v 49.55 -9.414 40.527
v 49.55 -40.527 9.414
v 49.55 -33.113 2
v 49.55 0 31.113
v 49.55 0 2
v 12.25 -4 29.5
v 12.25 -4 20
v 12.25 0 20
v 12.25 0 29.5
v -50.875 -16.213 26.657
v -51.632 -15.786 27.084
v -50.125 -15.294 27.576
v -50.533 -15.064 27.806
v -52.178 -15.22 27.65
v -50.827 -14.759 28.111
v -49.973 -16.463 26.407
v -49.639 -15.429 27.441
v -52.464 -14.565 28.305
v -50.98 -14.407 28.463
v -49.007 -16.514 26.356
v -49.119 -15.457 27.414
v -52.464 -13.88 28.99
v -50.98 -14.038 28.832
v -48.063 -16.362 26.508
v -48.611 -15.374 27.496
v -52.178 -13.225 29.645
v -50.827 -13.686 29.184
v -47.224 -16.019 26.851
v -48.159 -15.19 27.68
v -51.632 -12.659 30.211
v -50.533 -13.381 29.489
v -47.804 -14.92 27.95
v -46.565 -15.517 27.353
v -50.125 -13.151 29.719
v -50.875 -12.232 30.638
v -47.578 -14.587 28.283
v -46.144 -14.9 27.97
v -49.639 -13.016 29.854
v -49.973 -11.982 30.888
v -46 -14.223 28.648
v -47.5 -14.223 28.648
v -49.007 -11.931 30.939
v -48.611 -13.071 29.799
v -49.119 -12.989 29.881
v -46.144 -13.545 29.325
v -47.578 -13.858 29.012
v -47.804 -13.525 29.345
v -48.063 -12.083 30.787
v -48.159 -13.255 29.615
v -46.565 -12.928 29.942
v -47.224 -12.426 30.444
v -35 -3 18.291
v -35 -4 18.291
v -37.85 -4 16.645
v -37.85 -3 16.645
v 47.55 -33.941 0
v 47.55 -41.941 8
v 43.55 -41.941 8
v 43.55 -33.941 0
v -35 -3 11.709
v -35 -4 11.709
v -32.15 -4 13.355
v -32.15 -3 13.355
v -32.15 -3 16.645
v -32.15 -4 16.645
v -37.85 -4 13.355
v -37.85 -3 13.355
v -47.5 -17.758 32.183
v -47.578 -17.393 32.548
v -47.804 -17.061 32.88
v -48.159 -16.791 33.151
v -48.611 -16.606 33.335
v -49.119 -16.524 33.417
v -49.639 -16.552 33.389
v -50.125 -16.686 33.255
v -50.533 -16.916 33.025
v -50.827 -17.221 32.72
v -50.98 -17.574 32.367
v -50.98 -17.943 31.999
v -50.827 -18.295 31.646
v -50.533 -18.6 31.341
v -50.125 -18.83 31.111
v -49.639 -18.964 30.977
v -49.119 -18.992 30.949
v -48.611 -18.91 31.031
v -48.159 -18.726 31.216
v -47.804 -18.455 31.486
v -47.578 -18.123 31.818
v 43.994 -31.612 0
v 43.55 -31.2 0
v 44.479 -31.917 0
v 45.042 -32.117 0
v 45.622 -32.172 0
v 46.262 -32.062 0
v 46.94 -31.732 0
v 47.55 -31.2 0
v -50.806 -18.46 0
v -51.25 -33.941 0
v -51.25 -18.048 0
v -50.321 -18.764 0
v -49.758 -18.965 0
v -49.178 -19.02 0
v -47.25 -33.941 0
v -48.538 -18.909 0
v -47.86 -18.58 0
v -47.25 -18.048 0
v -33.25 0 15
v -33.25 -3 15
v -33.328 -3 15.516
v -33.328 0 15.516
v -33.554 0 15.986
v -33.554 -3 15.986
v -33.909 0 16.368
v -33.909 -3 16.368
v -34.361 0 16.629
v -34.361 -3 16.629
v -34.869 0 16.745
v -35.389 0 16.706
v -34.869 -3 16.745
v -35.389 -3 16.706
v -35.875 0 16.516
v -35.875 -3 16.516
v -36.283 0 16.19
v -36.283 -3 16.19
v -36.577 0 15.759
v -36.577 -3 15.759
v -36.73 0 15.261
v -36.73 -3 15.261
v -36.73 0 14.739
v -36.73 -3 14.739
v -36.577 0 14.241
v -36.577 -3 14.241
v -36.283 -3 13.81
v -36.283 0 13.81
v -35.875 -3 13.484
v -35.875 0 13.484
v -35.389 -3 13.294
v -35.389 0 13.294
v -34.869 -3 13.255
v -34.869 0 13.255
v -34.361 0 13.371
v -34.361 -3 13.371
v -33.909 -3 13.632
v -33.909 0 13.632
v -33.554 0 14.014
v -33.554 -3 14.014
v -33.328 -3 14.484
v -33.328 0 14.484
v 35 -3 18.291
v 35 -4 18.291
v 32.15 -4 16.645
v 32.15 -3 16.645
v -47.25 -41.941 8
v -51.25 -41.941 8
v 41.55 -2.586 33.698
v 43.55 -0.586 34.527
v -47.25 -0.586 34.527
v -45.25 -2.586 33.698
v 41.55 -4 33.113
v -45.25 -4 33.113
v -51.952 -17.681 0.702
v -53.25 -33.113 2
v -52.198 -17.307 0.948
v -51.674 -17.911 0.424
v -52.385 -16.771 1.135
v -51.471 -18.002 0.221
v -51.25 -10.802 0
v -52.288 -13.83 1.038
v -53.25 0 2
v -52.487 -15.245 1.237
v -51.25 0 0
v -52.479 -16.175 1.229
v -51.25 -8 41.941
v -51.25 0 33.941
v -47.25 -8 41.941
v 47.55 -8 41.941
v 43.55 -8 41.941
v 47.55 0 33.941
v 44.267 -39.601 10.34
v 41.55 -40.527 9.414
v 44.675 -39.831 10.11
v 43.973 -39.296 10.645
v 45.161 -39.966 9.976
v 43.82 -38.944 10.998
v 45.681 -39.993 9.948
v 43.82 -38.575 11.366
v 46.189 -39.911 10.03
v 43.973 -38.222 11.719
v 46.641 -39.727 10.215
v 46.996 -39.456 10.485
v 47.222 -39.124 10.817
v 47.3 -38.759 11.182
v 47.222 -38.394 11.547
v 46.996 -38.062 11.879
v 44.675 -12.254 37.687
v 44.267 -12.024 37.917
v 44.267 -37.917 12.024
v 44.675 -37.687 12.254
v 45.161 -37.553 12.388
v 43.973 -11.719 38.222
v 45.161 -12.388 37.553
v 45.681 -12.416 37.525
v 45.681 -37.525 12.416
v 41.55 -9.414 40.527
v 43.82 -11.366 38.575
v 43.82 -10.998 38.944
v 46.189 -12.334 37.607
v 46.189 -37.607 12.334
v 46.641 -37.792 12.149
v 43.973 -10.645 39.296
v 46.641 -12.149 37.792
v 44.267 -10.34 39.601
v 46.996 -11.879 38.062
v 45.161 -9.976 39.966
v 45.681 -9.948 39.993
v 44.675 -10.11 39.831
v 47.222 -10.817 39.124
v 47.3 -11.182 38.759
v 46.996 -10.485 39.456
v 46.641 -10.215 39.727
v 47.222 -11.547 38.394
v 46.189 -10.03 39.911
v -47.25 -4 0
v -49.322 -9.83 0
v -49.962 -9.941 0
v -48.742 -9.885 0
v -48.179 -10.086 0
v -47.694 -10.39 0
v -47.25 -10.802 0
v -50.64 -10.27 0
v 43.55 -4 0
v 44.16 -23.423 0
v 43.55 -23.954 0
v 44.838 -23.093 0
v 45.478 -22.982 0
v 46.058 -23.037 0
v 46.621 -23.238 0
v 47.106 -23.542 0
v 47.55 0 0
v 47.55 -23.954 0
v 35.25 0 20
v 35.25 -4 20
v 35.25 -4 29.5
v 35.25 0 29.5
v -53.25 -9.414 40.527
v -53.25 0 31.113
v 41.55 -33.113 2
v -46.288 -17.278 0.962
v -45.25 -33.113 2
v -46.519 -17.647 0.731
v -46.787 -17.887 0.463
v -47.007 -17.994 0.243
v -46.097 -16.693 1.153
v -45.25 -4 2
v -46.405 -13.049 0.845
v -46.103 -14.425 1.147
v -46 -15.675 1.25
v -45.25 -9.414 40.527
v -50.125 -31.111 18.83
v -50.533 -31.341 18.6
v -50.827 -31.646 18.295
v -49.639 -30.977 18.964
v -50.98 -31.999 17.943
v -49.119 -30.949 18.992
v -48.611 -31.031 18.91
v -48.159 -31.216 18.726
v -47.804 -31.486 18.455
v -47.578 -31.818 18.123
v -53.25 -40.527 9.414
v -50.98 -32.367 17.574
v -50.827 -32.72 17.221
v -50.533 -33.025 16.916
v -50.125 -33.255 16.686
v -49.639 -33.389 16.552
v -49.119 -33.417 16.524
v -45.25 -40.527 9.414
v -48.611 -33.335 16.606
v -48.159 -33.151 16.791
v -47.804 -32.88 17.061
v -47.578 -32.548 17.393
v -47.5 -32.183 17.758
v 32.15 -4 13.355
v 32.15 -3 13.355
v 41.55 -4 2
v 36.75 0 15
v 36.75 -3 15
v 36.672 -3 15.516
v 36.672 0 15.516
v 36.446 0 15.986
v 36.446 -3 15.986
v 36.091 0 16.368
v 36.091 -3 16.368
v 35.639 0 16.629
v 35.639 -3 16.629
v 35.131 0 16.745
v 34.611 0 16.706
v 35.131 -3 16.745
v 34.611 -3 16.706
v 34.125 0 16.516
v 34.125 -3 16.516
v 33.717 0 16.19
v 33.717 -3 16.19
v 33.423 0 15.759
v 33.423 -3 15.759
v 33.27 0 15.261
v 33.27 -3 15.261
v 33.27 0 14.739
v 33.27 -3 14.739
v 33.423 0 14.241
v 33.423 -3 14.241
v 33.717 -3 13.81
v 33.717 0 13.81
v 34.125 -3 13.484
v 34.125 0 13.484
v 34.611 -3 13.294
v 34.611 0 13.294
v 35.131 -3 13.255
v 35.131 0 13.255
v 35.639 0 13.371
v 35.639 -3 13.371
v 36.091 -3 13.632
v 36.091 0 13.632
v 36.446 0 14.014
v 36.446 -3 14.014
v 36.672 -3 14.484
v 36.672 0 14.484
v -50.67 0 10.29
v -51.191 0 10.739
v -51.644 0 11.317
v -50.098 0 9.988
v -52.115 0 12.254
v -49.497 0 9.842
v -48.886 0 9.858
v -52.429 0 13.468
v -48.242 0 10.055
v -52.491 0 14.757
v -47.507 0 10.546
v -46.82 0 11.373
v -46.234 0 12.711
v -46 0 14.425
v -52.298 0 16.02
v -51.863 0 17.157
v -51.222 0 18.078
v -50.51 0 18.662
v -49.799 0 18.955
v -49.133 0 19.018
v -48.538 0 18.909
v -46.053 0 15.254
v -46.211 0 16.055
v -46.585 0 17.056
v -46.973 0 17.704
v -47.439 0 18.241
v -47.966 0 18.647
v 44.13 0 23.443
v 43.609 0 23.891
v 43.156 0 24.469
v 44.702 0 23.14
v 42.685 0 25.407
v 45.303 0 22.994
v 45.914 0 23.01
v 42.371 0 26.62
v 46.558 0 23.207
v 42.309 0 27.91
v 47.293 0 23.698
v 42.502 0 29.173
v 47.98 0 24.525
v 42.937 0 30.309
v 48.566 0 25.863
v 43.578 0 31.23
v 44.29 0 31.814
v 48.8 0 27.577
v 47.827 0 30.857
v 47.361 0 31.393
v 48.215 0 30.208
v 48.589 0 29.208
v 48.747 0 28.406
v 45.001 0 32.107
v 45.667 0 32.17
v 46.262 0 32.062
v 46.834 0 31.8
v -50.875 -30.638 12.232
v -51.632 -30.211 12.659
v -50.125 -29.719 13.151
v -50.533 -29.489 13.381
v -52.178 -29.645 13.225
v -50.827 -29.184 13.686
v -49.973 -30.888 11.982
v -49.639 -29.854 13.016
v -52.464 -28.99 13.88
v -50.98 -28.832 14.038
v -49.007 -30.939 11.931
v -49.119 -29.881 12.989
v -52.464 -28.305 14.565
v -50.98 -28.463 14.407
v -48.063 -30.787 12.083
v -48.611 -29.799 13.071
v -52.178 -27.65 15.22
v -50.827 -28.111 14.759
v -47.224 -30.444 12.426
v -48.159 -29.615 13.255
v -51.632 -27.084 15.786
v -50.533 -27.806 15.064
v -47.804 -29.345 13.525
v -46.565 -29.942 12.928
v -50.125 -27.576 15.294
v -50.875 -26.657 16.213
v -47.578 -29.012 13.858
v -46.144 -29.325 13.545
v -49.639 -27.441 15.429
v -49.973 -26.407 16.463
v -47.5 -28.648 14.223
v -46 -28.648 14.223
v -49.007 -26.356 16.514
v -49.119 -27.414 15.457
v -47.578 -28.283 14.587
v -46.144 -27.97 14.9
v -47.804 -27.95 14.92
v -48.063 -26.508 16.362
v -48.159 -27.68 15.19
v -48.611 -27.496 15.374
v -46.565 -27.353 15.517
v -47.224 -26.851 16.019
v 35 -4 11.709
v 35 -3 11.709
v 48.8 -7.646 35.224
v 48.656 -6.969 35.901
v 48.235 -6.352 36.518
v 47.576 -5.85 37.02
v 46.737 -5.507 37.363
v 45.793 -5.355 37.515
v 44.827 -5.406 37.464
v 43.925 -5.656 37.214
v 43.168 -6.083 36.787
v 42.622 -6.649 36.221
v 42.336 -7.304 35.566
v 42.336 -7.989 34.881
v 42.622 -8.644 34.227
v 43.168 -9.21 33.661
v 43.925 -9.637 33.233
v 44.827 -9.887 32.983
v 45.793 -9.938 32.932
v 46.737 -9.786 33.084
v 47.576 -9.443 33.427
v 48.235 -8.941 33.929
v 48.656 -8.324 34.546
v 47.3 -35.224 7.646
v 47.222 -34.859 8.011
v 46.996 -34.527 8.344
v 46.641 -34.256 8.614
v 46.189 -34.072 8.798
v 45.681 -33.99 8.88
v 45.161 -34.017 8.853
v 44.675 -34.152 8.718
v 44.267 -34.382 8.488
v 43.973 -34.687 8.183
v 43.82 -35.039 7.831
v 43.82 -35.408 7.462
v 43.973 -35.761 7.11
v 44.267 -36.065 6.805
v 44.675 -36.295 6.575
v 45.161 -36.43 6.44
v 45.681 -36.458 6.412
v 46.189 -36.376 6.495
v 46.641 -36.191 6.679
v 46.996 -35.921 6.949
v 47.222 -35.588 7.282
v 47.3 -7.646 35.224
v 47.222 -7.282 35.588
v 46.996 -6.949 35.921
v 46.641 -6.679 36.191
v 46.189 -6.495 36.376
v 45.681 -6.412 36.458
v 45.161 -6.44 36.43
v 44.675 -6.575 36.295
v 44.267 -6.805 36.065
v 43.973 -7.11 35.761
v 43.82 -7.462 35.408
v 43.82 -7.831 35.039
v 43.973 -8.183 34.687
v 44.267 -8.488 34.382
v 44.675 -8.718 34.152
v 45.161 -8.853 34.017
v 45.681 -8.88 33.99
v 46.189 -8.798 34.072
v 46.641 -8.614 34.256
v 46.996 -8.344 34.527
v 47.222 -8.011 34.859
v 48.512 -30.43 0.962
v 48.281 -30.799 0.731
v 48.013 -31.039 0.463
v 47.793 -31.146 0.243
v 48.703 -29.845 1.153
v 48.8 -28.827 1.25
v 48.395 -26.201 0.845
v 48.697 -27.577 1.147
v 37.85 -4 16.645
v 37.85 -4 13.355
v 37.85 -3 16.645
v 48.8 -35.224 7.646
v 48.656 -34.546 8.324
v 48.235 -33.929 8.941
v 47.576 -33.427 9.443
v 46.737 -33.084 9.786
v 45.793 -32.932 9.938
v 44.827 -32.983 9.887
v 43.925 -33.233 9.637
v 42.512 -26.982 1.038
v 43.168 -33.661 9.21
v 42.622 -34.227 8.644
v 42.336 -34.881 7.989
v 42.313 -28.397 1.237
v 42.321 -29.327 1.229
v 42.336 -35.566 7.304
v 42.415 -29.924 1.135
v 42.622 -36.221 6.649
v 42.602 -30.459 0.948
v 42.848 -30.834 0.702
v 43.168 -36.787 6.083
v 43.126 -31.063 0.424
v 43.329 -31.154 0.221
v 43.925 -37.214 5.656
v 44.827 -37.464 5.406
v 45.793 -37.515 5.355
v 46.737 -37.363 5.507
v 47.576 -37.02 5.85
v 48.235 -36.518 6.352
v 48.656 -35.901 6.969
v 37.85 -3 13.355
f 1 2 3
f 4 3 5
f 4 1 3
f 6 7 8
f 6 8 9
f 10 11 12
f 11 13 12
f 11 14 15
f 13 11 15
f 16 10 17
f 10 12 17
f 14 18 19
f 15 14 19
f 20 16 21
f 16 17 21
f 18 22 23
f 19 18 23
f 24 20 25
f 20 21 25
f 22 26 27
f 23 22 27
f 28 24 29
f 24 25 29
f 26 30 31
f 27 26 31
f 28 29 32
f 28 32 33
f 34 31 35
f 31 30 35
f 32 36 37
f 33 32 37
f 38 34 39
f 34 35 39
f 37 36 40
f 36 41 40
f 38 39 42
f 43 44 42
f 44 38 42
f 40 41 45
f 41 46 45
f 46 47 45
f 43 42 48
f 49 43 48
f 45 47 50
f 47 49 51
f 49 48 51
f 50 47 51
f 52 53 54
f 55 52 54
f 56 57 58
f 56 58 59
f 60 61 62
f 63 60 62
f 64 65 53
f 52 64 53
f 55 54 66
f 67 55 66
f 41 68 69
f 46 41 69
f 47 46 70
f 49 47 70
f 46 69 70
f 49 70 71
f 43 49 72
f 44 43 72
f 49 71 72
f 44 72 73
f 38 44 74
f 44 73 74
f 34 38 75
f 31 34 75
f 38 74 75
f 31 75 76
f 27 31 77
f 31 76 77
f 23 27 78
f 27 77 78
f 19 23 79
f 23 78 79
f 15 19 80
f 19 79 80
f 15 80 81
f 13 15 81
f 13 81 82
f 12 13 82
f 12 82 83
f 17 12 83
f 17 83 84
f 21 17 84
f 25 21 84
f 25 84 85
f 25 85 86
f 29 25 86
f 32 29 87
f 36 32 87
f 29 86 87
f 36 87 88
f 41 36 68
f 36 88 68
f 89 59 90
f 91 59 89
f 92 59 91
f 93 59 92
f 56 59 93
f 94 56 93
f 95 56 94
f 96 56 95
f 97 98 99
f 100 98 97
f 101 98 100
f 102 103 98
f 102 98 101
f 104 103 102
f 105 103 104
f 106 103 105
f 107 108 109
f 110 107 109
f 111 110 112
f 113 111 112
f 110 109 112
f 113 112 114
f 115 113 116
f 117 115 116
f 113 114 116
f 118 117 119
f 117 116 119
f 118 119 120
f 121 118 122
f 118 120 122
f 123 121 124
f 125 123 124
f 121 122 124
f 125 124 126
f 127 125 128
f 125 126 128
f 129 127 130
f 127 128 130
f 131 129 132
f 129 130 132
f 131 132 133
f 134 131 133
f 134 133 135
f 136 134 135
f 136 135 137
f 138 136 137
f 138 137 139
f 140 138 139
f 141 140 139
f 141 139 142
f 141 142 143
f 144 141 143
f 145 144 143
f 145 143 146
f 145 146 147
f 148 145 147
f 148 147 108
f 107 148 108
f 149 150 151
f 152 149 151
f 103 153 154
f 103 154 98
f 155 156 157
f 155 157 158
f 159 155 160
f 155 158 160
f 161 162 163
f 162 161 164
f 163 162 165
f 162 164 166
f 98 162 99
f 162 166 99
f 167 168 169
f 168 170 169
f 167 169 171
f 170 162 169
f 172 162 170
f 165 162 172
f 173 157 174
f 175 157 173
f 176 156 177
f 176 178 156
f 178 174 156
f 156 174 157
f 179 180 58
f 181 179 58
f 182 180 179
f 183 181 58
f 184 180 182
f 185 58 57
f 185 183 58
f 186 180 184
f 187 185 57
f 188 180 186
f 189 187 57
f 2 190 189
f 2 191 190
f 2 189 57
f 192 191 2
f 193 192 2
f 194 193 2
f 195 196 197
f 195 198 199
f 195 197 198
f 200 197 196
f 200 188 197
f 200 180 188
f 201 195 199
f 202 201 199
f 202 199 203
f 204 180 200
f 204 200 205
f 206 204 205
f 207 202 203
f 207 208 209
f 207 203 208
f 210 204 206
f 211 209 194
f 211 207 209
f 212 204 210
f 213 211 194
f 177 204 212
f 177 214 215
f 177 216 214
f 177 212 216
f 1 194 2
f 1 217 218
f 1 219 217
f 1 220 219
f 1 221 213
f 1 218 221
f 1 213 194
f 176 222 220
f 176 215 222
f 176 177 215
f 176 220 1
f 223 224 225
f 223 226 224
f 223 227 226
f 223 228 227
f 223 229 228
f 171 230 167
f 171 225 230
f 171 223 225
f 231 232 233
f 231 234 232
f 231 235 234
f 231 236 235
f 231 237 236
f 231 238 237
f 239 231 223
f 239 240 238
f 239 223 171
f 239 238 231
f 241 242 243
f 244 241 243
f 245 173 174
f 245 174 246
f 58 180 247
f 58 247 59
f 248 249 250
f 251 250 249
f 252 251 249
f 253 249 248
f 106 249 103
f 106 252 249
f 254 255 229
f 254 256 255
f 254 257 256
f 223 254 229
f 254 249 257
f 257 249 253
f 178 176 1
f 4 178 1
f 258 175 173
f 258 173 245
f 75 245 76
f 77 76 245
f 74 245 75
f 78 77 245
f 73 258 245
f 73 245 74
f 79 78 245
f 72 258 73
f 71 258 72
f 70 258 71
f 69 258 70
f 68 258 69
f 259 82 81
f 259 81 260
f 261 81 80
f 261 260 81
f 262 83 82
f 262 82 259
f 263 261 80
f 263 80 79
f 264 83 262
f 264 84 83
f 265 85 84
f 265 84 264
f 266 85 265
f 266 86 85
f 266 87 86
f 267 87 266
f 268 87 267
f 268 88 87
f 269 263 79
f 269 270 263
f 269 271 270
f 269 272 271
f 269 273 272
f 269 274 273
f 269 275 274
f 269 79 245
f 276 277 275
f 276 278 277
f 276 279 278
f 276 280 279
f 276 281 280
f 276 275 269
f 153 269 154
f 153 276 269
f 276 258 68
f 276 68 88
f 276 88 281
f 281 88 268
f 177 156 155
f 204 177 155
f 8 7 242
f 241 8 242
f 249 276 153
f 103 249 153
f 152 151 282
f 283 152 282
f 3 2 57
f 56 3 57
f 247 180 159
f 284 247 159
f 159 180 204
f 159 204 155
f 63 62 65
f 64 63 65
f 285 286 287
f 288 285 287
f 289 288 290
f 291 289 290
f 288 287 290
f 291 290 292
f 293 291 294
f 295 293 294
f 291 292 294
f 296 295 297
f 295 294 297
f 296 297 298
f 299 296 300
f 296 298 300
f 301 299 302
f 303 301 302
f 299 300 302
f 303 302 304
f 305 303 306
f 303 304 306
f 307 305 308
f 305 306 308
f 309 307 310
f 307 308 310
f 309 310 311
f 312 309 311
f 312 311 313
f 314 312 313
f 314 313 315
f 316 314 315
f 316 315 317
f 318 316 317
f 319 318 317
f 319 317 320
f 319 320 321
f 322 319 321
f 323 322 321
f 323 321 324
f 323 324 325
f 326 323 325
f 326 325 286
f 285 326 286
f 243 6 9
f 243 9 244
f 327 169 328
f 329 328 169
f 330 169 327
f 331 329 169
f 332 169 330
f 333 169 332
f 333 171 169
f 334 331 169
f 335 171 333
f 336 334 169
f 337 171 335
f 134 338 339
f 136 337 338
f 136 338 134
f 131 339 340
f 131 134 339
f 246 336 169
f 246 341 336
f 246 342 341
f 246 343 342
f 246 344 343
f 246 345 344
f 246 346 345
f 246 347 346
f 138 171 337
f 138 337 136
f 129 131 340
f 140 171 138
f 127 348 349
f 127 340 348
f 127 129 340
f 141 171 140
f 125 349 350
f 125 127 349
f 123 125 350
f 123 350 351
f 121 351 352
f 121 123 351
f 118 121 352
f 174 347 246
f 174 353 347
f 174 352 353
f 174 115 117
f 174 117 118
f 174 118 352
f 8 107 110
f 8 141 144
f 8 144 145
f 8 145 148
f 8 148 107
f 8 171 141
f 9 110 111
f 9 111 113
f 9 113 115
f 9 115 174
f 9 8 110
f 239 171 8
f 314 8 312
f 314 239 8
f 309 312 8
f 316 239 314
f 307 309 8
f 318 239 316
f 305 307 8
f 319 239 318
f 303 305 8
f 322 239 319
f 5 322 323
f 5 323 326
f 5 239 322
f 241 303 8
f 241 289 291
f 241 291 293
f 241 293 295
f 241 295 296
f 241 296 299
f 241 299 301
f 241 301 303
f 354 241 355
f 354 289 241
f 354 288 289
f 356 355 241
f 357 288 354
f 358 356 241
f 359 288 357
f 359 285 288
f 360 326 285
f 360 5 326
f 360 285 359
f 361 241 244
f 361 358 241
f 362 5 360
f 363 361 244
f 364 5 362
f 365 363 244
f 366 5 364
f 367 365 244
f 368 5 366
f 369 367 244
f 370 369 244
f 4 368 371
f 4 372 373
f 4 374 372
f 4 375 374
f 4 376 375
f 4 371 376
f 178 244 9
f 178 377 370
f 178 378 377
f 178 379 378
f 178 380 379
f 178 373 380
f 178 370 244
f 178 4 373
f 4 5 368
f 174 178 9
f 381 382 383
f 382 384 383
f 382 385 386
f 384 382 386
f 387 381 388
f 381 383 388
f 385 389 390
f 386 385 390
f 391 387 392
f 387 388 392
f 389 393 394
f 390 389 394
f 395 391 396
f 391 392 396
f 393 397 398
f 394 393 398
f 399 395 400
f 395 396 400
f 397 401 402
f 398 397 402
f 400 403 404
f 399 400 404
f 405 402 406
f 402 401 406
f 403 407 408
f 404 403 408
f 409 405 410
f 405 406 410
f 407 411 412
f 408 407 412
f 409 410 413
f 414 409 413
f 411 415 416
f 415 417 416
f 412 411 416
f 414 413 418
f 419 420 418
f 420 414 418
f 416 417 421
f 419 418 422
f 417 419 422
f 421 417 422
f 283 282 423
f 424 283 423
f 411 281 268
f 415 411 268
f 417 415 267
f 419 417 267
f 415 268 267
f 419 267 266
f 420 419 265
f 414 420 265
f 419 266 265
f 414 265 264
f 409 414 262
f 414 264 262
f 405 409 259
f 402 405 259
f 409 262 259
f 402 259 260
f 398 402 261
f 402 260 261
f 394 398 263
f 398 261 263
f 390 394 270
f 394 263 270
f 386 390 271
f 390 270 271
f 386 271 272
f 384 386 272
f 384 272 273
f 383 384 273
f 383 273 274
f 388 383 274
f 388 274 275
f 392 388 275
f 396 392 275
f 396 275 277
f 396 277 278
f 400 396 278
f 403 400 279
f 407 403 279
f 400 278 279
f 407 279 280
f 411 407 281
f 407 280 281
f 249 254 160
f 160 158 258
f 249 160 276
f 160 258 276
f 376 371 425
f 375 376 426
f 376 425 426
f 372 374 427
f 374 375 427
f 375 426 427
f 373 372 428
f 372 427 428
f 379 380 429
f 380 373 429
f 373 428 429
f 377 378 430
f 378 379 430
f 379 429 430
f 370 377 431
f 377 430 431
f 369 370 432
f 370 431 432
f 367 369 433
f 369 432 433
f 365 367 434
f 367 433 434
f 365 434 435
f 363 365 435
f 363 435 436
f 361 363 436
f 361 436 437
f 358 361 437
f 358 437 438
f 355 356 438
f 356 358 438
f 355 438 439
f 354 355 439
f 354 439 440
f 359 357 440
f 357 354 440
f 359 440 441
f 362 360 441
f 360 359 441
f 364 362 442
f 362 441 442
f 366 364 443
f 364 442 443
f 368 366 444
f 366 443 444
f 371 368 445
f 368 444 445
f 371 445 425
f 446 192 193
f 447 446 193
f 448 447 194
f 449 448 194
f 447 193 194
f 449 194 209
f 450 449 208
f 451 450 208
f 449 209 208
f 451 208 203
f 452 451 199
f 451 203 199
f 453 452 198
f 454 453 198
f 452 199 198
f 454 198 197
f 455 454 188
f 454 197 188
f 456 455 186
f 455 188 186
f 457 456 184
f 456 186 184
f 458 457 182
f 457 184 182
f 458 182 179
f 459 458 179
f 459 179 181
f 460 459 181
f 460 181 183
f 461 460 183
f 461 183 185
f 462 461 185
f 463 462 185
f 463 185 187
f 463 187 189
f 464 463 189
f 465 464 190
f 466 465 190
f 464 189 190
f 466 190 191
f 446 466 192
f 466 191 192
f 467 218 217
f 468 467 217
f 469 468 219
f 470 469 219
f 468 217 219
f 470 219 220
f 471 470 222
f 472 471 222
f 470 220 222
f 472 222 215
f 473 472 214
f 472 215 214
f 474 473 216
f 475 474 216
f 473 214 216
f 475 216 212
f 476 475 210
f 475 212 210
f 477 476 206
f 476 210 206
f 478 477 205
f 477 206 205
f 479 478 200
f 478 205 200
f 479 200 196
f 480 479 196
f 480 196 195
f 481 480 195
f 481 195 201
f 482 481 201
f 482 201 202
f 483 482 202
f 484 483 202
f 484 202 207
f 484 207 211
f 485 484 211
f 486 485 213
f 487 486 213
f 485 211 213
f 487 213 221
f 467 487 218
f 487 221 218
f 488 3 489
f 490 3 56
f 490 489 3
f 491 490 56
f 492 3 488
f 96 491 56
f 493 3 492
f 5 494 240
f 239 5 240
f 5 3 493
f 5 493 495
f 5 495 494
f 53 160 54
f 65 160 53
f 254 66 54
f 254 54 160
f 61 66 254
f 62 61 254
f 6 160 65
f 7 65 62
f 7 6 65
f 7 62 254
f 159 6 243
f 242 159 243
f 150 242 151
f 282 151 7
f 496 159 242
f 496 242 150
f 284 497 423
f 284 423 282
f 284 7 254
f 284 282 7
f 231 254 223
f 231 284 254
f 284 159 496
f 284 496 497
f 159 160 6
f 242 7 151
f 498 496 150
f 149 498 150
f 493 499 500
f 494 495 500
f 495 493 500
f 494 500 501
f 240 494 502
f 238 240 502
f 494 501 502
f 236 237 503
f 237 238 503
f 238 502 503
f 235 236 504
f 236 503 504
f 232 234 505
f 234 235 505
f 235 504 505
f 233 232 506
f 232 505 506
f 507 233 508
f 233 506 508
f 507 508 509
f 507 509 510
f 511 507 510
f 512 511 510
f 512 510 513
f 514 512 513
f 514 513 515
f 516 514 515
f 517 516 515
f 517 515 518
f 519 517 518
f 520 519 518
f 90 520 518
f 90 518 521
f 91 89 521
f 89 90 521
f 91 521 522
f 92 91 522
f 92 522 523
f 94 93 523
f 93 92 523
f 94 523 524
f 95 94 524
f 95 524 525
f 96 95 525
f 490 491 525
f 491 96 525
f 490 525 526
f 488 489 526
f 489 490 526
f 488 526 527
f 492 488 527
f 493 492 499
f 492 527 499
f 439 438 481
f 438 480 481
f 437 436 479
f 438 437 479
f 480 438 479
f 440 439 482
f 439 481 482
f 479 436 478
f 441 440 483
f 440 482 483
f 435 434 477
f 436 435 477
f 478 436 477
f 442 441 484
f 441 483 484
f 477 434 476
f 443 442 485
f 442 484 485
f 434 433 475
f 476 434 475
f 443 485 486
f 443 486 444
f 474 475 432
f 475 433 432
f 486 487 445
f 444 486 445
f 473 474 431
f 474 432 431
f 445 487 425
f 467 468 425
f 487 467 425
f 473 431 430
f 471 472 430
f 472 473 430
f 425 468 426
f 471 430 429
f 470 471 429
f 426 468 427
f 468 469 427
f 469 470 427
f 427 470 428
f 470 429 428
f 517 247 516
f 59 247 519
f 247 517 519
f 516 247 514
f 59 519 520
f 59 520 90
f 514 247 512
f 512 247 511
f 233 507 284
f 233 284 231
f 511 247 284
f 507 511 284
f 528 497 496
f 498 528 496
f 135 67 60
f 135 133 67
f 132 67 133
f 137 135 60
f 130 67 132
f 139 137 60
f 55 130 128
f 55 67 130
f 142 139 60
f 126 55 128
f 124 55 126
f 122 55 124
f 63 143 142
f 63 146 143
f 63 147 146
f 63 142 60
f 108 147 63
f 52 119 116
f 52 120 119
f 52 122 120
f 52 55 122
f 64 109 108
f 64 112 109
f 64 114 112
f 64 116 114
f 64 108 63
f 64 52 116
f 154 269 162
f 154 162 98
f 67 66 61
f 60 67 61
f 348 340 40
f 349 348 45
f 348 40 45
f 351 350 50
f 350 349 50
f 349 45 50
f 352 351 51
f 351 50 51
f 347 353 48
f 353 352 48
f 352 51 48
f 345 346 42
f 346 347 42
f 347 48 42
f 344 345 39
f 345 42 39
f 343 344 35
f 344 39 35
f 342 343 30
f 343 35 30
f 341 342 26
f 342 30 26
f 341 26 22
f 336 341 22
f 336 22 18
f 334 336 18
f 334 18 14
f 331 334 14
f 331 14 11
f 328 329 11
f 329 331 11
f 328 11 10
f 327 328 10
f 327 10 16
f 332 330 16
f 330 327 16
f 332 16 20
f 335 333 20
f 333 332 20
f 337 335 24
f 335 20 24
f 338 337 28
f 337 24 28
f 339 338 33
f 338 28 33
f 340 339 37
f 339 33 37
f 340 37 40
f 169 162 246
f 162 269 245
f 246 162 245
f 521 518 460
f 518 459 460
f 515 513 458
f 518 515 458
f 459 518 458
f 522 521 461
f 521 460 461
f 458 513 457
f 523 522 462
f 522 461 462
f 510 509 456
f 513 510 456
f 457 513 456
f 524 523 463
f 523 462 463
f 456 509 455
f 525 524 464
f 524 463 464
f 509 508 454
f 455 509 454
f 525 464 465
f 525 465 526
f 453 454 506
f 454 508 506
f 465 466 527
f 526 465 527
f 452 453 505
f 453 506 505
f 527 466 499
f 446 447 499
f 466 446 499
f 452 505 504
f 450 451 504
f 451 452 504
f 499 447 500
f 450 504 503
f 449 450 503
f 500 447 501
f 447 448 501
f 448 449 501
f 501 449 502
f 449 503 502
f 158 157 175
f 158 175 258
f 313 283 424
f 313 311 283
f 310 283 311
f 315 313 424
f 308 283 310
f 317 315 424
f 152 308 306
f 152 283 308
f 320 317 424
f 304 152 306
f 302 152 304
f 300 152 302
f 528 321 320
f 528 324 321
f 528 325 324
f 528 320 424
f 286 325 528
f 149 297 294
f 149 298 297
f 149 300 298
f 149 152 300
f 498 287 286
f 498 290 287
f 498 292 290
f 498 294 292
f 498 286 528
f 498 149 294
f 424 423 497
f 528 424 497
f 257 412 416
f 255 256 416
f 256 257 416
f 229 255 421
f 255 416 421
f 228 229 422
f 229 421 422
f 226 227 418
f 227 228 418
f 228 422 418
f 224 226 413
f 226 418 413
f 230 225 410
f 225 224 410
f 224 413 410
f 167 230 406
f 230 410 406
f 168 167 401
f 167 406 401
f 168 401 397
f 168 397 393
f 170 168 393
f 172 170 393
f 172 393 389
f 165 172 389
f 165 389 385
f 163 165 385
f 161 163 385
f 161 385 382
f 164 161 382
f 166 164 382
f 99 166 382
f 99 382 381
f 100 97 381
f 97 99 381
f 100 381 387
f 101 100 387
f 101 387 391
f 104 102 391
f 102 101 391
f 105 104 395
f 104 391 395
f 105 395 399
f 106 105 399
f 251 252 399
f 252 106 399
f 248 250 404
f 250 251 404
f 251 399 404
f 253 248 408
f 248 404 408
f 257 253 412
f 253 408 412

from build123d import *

# Parameters (mm, degrees)
F2_DEPTH      = 4
F5_DEPTH      = 49.55
F5_DEPTH_BACK = 53.25
F6_R          = 3.25
F6_R_2        = 1.75
F7_DEPTH      = 35.314708499
F8_DEPTH      = 5
F9_R          = 1.75
F9_W          = 23
F9_H          = 9.5
F10_DEPTH     = 4.001
F11_DEPTH     = 1
F12_T1_DEPTH  = 21.6004404508
F12_T3_DEPTH  = 86.8
F12_T5_DEPTH  = 21.6004404508
F12_T7_DEPTH  = 44.2278574488
F12_T9_DEPTH  = 35.0844914729
F12_T14_DEPTH = 15.9435862014
F12_T19_DEPTH = 15.9435862014
F12_T25_DEPTH = 98.9490097203
F12_S28_R     = 3.25
F12_T29_DEPTH = 51
F12_T32_DEPTH = 10.8002202254
F12_T39_DEPTH = 10.8002202254
F12_T43_DEPTH = 98.9490097203


# Not quite as in the source:
# - a fillet or chamfer that OpenCascade refuses, or shapes differently, is made with other operations: its cross-section is extruded or revolved along the edge and cut away or added


with BuildPart() as f2:
    # F0 (on Right) → F2 (new body, symmetric)
    with BuildSketch(Plane.YZ):
        Polygon((-8, 41.941125497), (-24.9705627485, 24.9705627485), (-41.941125497, 8), (-33.941125497, 0), (-4, 0), (-4, 37.941125497), align=None)
    extrude(amount=F2_DEPTH, both=True)


with BuildPart() as f3_1:
    # F3: copy of F2
    add(f2.part.moved(Location((-49.25, 0, 0))))


with BuildPart() as f2_1:
    # F4: moved
    add(f2.part.moved(Location((45.55, 0, 0))))


    add(f3_1.part)  # F5 merges F3_1
    # F0 (on Right) → F5 (join, two sides)
    with BuildSketch(Plane.YZ) as f5_sk:
        Polygon((0, 33.941125497), (-4, 37.941125497), (-4, 0), (0, 0), align=None)
    extrude(amount=F5_DEPTH)
    extrude(f5_sk.sketch, amount=-F5_DEPTH_BACK)

    # F6 (on line) → F7 (cut, through all)
    with BuildSketch(Plane(origin=(0, -24.9705627485, 24.9705627485), x_dir=(1, 0, 0), z_dir=(0, -0.7071067812, 0.7071067812))):
        with Locations((-49.25, 10.2)):
            Circle(F6_R)
        with Locations((-49.25, 10.2)):
            Circle(F6_R_2, mode=Mode.SUBTRACT)
        with Locations((-49.25, 10.2)):
            Circle(F6_R_2)
        with Locations((-49.25, -10.2)):
            Circle(F6_R)
        with Locations((-49.25, -10.2)):
            Circle(F6_R_2, mode=Mode.SUBTRACT)
        with Locations((-49.25, -10.2)):
            Circle(F6_R_2)
        with Locations((45.55, 19.5)):
            Circle(F6_R)
        with Locations((45.55, 19.5)):
            Circle(F6_R_2, mode=Mode.SUBTRACT)
        with Locations((45.55, 19.5)):
            Circle(F6_R_2)
        with Locations((45.55, -19.5)):
            Circle(F6_R)
        with Locations((45.55, -19.5)):
            Circle(F6_R_2, mode=Mode.SUBTRACT)
        with Locations((45.55, -19.5)):
            Circle(F6_R_2)
    extrude(amount=-F7_DEPTH, mode=Mode.SUBTRACT)

    # F6 (on line) → F8 (join)
    with BuildSketch(Plane(origin=(0, -24.9705627485, 24.9705627485), x_dir=(1, 0, 0), z_dir=(0, -0.7071067812, 0.7071067812))):
        with Locations((45.55, -19.5)):
            Circle(F6_R)
        with Locations((45.55, -19.5)):
            Circle(F6_R_2, mode=Mode.SUBTRACT)
        with Locations((45.55, 19.5)):
            Circle(F6_R)
        with Locations((45.55, 19.5)):
            Circle(F6_R_2, mode=Mode.SUBTRACT)
        with Locations((-49.25, 10.2)):
            Circle(F6_R)
        with Locations((-49.25, 10.2)):
            Circle(F6_R_2, mode=Mode.SUBTRACT)
        with Locations((-49.25, -10.2)):
            Circle(F6_R)
        with Locations((-49.25, -10.2)):
            Circle(F6_R_2, mode=Mode.SUBTRACT)
    extrude(amount=-F8_DEPTH)

    # F9 (on face) → F10 (cut, through all)
    with BuildSketch(Plane.XZ.offset(4)):
        with Locations((-35, 15)):
            Circle(F9_R)
        with Locations((35, 15)):
            Circle(F9_R)
        with Locations((23.75, 24.75)):
            Rectangle(F9_W, F9_H)
    extrude(amount=-F10_DEPTH, mode=Mode.SUBTRACT)

    # F9 (on face) → F11 (cut)
    with BuildSketch(Plane.XZ.offset(4)):
        Polygon((-32.15, 13.3545517328), (-32.15, 16.6454482672), (-35, 18.2908965344), (-37.85, 16.6454482672), (-37.85, 13.3545517328), (-35, 11.7091034656), align=None)
        with Locations((-35, 15)):
            Circle(F9_R, mode=Mode.SUBTRACT)
        Polygon((37.85, 13.3545517328), (37.85, 16.6454482672), (35, 18.2908965344), (32.15, 16.6454482672), (32.15, 13.3545517328), (35, 11.7091034656), align=None)
        with Locations((35, 15)):
            Circle(F9_R, mode=Mode.SUBTRACT)
    extrude(amount=-F11_DEPTH, mode=Mode.SUBTRACT)

    # F12: chamfer of 2 on 13 edges, made by hand

    # F12_s2 → F12_t1 (cut)
    with BuildSketch(Plane(origin=(0, -28.6074717082, 28.6074717082), x_dir=(1, 0, 0), z_dir=(0, 0.7071067812, -0.7071067812))):
        Polygon((47.55, -24), (49.55, -22), (49.55, -24), align=None)
        Polygon((-53.25, 22), (-51.25, 24), (-53.25, 24), align=None)
        Polygon((-45.25, 22), (-47.25, 24), (-45.25, 24), align=None)
        Polygon((41.55, 22), (43.55, 24), (41.55, 24), align=None)
        Polygon((49.55, 22), (47.55, 24), (49.55, 24), align=None)
    extrude(amount=F12_T1_DEPTH, mode=Mode.SUBTRACT)

    # F12_s4 → F12_t3 (cut)
    with BuildSketch(Plane.YZ.offset(-45.25)):
        Polygon((-0.5857864376, 34.5269119346), (-4, 33.1126983722), (-4, 37.941125497), align=None)
    extrude(amount=F12_T3_DEPTH, mode=Mode.SUBTRACT)

    # F12_s6 → F12_t5 (cut)
    with BuildSketch(Plane(origin=(0, -13.3336537888, 13.3336537888), x_dir=(1, 0, 0), z_dir=(0, -0.7071067812, 0.7071067812))):
        Polygon((-51.25, 24), (-53.25, 22), (-53.25, 24), align=None)
    extrude(amount=F12_T5_DEPTH, mode=Mode.SUBTRACT)

    # F12_s8 → F12_t7 (cut)
    with BuildSketch(Plane.XZ.offset(-5.1433659759)):
        Polygon((-53.25, 2), (-51.25, 0), (-53.25, 0), align=None)
        Polygon((49.55, 2), (47.55, 0), (49.55, 0), align=None)
    extrude(amount=F12_T7_DEPTH, mode=Mode.SUBTRACT)

    # F12_s10 → F12_t9 (cut)
    with BuildSketch(Plane.XZ.offset(4)):
        Polygon((-45.25, 2), (-47.25, 0), (-45.25, 0), align=None)
        Polygon((41.55, 2), (43.55, 0), (41.55, 0), align=None)
    extrude(amount=F12_T9_DEPTH, mode=Mode.SUBTRACT)


with BuildPart() as f12_tool12:
    # F12_s13 → F12_t14 (new body)
    with BuildSketch(Plane(origin=(0, -17.3336537888, 17.3336537888), x_dir=(1, 0, 0), z_dir=(0, -0.7071067812, 0.7071067812))):
        Polygon((-47.25, 24), (-45.25, 22), (-45.25, 24), align=None)
    extrude(amount=F12_T14_DEPTH)

    split(bisect_by=Plane.XZ.offset(4), keep=Keep.TOP)


with BuildPart() as f2_2:
    add(f2_1.part)

    # F12_t11: cut F12_tool12
    add(f12_tool12.part, mode=Mode.SUBTRACT)


with BuildPart() as f12_tool17:
    # F12_s18 → F12_t19 (new body)
    with BuildSketch(Plane(origin=(0, -17.3336537888, 17.3336537888), x_dir=(1, 0, 0), z_dir=(0, -0.7071067812, 0.7071067812))):
        Polygon((43.55, 24), (41.55, 22), (41.55, 24), align=None)
    extrude(amount=F12_T19_DEPTH)

    split(bisect_by=Plane.XZ.offset(4), keep=Keep.TOP)


with BuildPart() as f2_3:
    add(f2_2.part)

    # F12_t16: cut F12_tool17
    add(f12_tool17.part, mode=Mode.SUBTRACT)


with BuildPart() as f12_tool23:
    # F12_s24 → F12_t25 (new body)
    with BuildSketch(Plane.YZ.offset(53.6990097203)):
        Polygon((-0.5857864376, 34.5269119346), (-4, 33.1126983722), (-4, 37.941125497), align=None)
    extrude(amount=-F12_T25_DEPTH)

    split(bisect_by=Plane.YZ.offset(41.55), keep=Keep.TOP)

    split(bisect_by=Plane.YZ.offset(49.55), keep=Keep.BOTTOM)

    # F12_s28 → F12_t29 (cut, symmetric)
    with BuildSketch(Plane(origin=(0, -18.8797510577, 18.8797510577), x_dir=(1, 0, 0), z_dir=(0, -0.7071067812, 0.7071067812))):
        with Locations((45.55, 19.5)):
            Circle(F12_S28_R)
    extrude(amount=F12_T29_DEPTH, both=True, mode=Mode.SUBTRACT)


with BuildPart() as f12_tool30:
    # F12_s31 → F12_t32 (new body)
    with BuildSketch(Plane(origin=(0, -17.3336537888, 17.3336537888), x_dir=(1, 0, 0), z_dir=(0, -0.7071067812, 0.7071067812))):
        Polygon((43.55, 24), (41.55, 22), (41.55, 24), align=None)
    extrude(amount=F12_T32_DEPTH)

    split(bisect_by=Plane.XZ.offset(4), keep=Keep.BOTTOM)


with BuildPart() as f12_tool23_1:
    add(f12_tool23.part)

    # F12_t34: intersect F12_tool30
    add(f12_tool30.part, mode=Mode.INTERSECT)


with BuildPart() as f2_4:
    add(f2_3.part)

    # F12_t21: cut F12_tool23
    add(f12_tool23_1.part, mode=Mode.SUBTRACT)


with BuildPart() as f12_tool37:
    # F12_s38 → F12_t39 (new body)
    with BuildSketch(Plane(origin=(0, -17.3336537888, 17.3336537888), x_dir=(1, 0, 0), z_dir=(0, -0.7071067812, 0.7071067812))):
        Polygon((-47.25, 24), (-45.25, 22), (-45.25, 24), align=None)
    extrude(amount=F12_T39_DEPTH)

    split(bisect_by=Plane.XZ.offset(4), keep=Keep.BOTTOM)


with BuildPart() as f12_tool41:
    # F12_s42 → F12_t43 (new body)
    with BuildSketch(Plane.YZ.offset(41.55)):
        Polygon((-0.5857864376, 34.5269119346), (-4, 33.1126983722), (-4, 37.941125497), align=None)
    extrude(amount=-F12_T43_DEPTH)

    split(bisect_by=Plane.YZ.offset(-45.25), keep=Keep.BOTTOM)

    split(bisect_by=Plane.YZ.offset(-53.25), keep=Keep.TOP)


with BuildPart() as f12_tool37_1:
    add(f12_tool37.part)

    # F12_t46: intersect F12_tool41
    add(f12_tool41.part, mode=Mode.INTERSECT)


with BuildPart() as f2_5:
    add(f2_4.part)

    # F12_t35: cut F12_tool37
    add(f12_tool37_1.part, mode=Mode.SUBTRACT)


solid = f2_5.part
